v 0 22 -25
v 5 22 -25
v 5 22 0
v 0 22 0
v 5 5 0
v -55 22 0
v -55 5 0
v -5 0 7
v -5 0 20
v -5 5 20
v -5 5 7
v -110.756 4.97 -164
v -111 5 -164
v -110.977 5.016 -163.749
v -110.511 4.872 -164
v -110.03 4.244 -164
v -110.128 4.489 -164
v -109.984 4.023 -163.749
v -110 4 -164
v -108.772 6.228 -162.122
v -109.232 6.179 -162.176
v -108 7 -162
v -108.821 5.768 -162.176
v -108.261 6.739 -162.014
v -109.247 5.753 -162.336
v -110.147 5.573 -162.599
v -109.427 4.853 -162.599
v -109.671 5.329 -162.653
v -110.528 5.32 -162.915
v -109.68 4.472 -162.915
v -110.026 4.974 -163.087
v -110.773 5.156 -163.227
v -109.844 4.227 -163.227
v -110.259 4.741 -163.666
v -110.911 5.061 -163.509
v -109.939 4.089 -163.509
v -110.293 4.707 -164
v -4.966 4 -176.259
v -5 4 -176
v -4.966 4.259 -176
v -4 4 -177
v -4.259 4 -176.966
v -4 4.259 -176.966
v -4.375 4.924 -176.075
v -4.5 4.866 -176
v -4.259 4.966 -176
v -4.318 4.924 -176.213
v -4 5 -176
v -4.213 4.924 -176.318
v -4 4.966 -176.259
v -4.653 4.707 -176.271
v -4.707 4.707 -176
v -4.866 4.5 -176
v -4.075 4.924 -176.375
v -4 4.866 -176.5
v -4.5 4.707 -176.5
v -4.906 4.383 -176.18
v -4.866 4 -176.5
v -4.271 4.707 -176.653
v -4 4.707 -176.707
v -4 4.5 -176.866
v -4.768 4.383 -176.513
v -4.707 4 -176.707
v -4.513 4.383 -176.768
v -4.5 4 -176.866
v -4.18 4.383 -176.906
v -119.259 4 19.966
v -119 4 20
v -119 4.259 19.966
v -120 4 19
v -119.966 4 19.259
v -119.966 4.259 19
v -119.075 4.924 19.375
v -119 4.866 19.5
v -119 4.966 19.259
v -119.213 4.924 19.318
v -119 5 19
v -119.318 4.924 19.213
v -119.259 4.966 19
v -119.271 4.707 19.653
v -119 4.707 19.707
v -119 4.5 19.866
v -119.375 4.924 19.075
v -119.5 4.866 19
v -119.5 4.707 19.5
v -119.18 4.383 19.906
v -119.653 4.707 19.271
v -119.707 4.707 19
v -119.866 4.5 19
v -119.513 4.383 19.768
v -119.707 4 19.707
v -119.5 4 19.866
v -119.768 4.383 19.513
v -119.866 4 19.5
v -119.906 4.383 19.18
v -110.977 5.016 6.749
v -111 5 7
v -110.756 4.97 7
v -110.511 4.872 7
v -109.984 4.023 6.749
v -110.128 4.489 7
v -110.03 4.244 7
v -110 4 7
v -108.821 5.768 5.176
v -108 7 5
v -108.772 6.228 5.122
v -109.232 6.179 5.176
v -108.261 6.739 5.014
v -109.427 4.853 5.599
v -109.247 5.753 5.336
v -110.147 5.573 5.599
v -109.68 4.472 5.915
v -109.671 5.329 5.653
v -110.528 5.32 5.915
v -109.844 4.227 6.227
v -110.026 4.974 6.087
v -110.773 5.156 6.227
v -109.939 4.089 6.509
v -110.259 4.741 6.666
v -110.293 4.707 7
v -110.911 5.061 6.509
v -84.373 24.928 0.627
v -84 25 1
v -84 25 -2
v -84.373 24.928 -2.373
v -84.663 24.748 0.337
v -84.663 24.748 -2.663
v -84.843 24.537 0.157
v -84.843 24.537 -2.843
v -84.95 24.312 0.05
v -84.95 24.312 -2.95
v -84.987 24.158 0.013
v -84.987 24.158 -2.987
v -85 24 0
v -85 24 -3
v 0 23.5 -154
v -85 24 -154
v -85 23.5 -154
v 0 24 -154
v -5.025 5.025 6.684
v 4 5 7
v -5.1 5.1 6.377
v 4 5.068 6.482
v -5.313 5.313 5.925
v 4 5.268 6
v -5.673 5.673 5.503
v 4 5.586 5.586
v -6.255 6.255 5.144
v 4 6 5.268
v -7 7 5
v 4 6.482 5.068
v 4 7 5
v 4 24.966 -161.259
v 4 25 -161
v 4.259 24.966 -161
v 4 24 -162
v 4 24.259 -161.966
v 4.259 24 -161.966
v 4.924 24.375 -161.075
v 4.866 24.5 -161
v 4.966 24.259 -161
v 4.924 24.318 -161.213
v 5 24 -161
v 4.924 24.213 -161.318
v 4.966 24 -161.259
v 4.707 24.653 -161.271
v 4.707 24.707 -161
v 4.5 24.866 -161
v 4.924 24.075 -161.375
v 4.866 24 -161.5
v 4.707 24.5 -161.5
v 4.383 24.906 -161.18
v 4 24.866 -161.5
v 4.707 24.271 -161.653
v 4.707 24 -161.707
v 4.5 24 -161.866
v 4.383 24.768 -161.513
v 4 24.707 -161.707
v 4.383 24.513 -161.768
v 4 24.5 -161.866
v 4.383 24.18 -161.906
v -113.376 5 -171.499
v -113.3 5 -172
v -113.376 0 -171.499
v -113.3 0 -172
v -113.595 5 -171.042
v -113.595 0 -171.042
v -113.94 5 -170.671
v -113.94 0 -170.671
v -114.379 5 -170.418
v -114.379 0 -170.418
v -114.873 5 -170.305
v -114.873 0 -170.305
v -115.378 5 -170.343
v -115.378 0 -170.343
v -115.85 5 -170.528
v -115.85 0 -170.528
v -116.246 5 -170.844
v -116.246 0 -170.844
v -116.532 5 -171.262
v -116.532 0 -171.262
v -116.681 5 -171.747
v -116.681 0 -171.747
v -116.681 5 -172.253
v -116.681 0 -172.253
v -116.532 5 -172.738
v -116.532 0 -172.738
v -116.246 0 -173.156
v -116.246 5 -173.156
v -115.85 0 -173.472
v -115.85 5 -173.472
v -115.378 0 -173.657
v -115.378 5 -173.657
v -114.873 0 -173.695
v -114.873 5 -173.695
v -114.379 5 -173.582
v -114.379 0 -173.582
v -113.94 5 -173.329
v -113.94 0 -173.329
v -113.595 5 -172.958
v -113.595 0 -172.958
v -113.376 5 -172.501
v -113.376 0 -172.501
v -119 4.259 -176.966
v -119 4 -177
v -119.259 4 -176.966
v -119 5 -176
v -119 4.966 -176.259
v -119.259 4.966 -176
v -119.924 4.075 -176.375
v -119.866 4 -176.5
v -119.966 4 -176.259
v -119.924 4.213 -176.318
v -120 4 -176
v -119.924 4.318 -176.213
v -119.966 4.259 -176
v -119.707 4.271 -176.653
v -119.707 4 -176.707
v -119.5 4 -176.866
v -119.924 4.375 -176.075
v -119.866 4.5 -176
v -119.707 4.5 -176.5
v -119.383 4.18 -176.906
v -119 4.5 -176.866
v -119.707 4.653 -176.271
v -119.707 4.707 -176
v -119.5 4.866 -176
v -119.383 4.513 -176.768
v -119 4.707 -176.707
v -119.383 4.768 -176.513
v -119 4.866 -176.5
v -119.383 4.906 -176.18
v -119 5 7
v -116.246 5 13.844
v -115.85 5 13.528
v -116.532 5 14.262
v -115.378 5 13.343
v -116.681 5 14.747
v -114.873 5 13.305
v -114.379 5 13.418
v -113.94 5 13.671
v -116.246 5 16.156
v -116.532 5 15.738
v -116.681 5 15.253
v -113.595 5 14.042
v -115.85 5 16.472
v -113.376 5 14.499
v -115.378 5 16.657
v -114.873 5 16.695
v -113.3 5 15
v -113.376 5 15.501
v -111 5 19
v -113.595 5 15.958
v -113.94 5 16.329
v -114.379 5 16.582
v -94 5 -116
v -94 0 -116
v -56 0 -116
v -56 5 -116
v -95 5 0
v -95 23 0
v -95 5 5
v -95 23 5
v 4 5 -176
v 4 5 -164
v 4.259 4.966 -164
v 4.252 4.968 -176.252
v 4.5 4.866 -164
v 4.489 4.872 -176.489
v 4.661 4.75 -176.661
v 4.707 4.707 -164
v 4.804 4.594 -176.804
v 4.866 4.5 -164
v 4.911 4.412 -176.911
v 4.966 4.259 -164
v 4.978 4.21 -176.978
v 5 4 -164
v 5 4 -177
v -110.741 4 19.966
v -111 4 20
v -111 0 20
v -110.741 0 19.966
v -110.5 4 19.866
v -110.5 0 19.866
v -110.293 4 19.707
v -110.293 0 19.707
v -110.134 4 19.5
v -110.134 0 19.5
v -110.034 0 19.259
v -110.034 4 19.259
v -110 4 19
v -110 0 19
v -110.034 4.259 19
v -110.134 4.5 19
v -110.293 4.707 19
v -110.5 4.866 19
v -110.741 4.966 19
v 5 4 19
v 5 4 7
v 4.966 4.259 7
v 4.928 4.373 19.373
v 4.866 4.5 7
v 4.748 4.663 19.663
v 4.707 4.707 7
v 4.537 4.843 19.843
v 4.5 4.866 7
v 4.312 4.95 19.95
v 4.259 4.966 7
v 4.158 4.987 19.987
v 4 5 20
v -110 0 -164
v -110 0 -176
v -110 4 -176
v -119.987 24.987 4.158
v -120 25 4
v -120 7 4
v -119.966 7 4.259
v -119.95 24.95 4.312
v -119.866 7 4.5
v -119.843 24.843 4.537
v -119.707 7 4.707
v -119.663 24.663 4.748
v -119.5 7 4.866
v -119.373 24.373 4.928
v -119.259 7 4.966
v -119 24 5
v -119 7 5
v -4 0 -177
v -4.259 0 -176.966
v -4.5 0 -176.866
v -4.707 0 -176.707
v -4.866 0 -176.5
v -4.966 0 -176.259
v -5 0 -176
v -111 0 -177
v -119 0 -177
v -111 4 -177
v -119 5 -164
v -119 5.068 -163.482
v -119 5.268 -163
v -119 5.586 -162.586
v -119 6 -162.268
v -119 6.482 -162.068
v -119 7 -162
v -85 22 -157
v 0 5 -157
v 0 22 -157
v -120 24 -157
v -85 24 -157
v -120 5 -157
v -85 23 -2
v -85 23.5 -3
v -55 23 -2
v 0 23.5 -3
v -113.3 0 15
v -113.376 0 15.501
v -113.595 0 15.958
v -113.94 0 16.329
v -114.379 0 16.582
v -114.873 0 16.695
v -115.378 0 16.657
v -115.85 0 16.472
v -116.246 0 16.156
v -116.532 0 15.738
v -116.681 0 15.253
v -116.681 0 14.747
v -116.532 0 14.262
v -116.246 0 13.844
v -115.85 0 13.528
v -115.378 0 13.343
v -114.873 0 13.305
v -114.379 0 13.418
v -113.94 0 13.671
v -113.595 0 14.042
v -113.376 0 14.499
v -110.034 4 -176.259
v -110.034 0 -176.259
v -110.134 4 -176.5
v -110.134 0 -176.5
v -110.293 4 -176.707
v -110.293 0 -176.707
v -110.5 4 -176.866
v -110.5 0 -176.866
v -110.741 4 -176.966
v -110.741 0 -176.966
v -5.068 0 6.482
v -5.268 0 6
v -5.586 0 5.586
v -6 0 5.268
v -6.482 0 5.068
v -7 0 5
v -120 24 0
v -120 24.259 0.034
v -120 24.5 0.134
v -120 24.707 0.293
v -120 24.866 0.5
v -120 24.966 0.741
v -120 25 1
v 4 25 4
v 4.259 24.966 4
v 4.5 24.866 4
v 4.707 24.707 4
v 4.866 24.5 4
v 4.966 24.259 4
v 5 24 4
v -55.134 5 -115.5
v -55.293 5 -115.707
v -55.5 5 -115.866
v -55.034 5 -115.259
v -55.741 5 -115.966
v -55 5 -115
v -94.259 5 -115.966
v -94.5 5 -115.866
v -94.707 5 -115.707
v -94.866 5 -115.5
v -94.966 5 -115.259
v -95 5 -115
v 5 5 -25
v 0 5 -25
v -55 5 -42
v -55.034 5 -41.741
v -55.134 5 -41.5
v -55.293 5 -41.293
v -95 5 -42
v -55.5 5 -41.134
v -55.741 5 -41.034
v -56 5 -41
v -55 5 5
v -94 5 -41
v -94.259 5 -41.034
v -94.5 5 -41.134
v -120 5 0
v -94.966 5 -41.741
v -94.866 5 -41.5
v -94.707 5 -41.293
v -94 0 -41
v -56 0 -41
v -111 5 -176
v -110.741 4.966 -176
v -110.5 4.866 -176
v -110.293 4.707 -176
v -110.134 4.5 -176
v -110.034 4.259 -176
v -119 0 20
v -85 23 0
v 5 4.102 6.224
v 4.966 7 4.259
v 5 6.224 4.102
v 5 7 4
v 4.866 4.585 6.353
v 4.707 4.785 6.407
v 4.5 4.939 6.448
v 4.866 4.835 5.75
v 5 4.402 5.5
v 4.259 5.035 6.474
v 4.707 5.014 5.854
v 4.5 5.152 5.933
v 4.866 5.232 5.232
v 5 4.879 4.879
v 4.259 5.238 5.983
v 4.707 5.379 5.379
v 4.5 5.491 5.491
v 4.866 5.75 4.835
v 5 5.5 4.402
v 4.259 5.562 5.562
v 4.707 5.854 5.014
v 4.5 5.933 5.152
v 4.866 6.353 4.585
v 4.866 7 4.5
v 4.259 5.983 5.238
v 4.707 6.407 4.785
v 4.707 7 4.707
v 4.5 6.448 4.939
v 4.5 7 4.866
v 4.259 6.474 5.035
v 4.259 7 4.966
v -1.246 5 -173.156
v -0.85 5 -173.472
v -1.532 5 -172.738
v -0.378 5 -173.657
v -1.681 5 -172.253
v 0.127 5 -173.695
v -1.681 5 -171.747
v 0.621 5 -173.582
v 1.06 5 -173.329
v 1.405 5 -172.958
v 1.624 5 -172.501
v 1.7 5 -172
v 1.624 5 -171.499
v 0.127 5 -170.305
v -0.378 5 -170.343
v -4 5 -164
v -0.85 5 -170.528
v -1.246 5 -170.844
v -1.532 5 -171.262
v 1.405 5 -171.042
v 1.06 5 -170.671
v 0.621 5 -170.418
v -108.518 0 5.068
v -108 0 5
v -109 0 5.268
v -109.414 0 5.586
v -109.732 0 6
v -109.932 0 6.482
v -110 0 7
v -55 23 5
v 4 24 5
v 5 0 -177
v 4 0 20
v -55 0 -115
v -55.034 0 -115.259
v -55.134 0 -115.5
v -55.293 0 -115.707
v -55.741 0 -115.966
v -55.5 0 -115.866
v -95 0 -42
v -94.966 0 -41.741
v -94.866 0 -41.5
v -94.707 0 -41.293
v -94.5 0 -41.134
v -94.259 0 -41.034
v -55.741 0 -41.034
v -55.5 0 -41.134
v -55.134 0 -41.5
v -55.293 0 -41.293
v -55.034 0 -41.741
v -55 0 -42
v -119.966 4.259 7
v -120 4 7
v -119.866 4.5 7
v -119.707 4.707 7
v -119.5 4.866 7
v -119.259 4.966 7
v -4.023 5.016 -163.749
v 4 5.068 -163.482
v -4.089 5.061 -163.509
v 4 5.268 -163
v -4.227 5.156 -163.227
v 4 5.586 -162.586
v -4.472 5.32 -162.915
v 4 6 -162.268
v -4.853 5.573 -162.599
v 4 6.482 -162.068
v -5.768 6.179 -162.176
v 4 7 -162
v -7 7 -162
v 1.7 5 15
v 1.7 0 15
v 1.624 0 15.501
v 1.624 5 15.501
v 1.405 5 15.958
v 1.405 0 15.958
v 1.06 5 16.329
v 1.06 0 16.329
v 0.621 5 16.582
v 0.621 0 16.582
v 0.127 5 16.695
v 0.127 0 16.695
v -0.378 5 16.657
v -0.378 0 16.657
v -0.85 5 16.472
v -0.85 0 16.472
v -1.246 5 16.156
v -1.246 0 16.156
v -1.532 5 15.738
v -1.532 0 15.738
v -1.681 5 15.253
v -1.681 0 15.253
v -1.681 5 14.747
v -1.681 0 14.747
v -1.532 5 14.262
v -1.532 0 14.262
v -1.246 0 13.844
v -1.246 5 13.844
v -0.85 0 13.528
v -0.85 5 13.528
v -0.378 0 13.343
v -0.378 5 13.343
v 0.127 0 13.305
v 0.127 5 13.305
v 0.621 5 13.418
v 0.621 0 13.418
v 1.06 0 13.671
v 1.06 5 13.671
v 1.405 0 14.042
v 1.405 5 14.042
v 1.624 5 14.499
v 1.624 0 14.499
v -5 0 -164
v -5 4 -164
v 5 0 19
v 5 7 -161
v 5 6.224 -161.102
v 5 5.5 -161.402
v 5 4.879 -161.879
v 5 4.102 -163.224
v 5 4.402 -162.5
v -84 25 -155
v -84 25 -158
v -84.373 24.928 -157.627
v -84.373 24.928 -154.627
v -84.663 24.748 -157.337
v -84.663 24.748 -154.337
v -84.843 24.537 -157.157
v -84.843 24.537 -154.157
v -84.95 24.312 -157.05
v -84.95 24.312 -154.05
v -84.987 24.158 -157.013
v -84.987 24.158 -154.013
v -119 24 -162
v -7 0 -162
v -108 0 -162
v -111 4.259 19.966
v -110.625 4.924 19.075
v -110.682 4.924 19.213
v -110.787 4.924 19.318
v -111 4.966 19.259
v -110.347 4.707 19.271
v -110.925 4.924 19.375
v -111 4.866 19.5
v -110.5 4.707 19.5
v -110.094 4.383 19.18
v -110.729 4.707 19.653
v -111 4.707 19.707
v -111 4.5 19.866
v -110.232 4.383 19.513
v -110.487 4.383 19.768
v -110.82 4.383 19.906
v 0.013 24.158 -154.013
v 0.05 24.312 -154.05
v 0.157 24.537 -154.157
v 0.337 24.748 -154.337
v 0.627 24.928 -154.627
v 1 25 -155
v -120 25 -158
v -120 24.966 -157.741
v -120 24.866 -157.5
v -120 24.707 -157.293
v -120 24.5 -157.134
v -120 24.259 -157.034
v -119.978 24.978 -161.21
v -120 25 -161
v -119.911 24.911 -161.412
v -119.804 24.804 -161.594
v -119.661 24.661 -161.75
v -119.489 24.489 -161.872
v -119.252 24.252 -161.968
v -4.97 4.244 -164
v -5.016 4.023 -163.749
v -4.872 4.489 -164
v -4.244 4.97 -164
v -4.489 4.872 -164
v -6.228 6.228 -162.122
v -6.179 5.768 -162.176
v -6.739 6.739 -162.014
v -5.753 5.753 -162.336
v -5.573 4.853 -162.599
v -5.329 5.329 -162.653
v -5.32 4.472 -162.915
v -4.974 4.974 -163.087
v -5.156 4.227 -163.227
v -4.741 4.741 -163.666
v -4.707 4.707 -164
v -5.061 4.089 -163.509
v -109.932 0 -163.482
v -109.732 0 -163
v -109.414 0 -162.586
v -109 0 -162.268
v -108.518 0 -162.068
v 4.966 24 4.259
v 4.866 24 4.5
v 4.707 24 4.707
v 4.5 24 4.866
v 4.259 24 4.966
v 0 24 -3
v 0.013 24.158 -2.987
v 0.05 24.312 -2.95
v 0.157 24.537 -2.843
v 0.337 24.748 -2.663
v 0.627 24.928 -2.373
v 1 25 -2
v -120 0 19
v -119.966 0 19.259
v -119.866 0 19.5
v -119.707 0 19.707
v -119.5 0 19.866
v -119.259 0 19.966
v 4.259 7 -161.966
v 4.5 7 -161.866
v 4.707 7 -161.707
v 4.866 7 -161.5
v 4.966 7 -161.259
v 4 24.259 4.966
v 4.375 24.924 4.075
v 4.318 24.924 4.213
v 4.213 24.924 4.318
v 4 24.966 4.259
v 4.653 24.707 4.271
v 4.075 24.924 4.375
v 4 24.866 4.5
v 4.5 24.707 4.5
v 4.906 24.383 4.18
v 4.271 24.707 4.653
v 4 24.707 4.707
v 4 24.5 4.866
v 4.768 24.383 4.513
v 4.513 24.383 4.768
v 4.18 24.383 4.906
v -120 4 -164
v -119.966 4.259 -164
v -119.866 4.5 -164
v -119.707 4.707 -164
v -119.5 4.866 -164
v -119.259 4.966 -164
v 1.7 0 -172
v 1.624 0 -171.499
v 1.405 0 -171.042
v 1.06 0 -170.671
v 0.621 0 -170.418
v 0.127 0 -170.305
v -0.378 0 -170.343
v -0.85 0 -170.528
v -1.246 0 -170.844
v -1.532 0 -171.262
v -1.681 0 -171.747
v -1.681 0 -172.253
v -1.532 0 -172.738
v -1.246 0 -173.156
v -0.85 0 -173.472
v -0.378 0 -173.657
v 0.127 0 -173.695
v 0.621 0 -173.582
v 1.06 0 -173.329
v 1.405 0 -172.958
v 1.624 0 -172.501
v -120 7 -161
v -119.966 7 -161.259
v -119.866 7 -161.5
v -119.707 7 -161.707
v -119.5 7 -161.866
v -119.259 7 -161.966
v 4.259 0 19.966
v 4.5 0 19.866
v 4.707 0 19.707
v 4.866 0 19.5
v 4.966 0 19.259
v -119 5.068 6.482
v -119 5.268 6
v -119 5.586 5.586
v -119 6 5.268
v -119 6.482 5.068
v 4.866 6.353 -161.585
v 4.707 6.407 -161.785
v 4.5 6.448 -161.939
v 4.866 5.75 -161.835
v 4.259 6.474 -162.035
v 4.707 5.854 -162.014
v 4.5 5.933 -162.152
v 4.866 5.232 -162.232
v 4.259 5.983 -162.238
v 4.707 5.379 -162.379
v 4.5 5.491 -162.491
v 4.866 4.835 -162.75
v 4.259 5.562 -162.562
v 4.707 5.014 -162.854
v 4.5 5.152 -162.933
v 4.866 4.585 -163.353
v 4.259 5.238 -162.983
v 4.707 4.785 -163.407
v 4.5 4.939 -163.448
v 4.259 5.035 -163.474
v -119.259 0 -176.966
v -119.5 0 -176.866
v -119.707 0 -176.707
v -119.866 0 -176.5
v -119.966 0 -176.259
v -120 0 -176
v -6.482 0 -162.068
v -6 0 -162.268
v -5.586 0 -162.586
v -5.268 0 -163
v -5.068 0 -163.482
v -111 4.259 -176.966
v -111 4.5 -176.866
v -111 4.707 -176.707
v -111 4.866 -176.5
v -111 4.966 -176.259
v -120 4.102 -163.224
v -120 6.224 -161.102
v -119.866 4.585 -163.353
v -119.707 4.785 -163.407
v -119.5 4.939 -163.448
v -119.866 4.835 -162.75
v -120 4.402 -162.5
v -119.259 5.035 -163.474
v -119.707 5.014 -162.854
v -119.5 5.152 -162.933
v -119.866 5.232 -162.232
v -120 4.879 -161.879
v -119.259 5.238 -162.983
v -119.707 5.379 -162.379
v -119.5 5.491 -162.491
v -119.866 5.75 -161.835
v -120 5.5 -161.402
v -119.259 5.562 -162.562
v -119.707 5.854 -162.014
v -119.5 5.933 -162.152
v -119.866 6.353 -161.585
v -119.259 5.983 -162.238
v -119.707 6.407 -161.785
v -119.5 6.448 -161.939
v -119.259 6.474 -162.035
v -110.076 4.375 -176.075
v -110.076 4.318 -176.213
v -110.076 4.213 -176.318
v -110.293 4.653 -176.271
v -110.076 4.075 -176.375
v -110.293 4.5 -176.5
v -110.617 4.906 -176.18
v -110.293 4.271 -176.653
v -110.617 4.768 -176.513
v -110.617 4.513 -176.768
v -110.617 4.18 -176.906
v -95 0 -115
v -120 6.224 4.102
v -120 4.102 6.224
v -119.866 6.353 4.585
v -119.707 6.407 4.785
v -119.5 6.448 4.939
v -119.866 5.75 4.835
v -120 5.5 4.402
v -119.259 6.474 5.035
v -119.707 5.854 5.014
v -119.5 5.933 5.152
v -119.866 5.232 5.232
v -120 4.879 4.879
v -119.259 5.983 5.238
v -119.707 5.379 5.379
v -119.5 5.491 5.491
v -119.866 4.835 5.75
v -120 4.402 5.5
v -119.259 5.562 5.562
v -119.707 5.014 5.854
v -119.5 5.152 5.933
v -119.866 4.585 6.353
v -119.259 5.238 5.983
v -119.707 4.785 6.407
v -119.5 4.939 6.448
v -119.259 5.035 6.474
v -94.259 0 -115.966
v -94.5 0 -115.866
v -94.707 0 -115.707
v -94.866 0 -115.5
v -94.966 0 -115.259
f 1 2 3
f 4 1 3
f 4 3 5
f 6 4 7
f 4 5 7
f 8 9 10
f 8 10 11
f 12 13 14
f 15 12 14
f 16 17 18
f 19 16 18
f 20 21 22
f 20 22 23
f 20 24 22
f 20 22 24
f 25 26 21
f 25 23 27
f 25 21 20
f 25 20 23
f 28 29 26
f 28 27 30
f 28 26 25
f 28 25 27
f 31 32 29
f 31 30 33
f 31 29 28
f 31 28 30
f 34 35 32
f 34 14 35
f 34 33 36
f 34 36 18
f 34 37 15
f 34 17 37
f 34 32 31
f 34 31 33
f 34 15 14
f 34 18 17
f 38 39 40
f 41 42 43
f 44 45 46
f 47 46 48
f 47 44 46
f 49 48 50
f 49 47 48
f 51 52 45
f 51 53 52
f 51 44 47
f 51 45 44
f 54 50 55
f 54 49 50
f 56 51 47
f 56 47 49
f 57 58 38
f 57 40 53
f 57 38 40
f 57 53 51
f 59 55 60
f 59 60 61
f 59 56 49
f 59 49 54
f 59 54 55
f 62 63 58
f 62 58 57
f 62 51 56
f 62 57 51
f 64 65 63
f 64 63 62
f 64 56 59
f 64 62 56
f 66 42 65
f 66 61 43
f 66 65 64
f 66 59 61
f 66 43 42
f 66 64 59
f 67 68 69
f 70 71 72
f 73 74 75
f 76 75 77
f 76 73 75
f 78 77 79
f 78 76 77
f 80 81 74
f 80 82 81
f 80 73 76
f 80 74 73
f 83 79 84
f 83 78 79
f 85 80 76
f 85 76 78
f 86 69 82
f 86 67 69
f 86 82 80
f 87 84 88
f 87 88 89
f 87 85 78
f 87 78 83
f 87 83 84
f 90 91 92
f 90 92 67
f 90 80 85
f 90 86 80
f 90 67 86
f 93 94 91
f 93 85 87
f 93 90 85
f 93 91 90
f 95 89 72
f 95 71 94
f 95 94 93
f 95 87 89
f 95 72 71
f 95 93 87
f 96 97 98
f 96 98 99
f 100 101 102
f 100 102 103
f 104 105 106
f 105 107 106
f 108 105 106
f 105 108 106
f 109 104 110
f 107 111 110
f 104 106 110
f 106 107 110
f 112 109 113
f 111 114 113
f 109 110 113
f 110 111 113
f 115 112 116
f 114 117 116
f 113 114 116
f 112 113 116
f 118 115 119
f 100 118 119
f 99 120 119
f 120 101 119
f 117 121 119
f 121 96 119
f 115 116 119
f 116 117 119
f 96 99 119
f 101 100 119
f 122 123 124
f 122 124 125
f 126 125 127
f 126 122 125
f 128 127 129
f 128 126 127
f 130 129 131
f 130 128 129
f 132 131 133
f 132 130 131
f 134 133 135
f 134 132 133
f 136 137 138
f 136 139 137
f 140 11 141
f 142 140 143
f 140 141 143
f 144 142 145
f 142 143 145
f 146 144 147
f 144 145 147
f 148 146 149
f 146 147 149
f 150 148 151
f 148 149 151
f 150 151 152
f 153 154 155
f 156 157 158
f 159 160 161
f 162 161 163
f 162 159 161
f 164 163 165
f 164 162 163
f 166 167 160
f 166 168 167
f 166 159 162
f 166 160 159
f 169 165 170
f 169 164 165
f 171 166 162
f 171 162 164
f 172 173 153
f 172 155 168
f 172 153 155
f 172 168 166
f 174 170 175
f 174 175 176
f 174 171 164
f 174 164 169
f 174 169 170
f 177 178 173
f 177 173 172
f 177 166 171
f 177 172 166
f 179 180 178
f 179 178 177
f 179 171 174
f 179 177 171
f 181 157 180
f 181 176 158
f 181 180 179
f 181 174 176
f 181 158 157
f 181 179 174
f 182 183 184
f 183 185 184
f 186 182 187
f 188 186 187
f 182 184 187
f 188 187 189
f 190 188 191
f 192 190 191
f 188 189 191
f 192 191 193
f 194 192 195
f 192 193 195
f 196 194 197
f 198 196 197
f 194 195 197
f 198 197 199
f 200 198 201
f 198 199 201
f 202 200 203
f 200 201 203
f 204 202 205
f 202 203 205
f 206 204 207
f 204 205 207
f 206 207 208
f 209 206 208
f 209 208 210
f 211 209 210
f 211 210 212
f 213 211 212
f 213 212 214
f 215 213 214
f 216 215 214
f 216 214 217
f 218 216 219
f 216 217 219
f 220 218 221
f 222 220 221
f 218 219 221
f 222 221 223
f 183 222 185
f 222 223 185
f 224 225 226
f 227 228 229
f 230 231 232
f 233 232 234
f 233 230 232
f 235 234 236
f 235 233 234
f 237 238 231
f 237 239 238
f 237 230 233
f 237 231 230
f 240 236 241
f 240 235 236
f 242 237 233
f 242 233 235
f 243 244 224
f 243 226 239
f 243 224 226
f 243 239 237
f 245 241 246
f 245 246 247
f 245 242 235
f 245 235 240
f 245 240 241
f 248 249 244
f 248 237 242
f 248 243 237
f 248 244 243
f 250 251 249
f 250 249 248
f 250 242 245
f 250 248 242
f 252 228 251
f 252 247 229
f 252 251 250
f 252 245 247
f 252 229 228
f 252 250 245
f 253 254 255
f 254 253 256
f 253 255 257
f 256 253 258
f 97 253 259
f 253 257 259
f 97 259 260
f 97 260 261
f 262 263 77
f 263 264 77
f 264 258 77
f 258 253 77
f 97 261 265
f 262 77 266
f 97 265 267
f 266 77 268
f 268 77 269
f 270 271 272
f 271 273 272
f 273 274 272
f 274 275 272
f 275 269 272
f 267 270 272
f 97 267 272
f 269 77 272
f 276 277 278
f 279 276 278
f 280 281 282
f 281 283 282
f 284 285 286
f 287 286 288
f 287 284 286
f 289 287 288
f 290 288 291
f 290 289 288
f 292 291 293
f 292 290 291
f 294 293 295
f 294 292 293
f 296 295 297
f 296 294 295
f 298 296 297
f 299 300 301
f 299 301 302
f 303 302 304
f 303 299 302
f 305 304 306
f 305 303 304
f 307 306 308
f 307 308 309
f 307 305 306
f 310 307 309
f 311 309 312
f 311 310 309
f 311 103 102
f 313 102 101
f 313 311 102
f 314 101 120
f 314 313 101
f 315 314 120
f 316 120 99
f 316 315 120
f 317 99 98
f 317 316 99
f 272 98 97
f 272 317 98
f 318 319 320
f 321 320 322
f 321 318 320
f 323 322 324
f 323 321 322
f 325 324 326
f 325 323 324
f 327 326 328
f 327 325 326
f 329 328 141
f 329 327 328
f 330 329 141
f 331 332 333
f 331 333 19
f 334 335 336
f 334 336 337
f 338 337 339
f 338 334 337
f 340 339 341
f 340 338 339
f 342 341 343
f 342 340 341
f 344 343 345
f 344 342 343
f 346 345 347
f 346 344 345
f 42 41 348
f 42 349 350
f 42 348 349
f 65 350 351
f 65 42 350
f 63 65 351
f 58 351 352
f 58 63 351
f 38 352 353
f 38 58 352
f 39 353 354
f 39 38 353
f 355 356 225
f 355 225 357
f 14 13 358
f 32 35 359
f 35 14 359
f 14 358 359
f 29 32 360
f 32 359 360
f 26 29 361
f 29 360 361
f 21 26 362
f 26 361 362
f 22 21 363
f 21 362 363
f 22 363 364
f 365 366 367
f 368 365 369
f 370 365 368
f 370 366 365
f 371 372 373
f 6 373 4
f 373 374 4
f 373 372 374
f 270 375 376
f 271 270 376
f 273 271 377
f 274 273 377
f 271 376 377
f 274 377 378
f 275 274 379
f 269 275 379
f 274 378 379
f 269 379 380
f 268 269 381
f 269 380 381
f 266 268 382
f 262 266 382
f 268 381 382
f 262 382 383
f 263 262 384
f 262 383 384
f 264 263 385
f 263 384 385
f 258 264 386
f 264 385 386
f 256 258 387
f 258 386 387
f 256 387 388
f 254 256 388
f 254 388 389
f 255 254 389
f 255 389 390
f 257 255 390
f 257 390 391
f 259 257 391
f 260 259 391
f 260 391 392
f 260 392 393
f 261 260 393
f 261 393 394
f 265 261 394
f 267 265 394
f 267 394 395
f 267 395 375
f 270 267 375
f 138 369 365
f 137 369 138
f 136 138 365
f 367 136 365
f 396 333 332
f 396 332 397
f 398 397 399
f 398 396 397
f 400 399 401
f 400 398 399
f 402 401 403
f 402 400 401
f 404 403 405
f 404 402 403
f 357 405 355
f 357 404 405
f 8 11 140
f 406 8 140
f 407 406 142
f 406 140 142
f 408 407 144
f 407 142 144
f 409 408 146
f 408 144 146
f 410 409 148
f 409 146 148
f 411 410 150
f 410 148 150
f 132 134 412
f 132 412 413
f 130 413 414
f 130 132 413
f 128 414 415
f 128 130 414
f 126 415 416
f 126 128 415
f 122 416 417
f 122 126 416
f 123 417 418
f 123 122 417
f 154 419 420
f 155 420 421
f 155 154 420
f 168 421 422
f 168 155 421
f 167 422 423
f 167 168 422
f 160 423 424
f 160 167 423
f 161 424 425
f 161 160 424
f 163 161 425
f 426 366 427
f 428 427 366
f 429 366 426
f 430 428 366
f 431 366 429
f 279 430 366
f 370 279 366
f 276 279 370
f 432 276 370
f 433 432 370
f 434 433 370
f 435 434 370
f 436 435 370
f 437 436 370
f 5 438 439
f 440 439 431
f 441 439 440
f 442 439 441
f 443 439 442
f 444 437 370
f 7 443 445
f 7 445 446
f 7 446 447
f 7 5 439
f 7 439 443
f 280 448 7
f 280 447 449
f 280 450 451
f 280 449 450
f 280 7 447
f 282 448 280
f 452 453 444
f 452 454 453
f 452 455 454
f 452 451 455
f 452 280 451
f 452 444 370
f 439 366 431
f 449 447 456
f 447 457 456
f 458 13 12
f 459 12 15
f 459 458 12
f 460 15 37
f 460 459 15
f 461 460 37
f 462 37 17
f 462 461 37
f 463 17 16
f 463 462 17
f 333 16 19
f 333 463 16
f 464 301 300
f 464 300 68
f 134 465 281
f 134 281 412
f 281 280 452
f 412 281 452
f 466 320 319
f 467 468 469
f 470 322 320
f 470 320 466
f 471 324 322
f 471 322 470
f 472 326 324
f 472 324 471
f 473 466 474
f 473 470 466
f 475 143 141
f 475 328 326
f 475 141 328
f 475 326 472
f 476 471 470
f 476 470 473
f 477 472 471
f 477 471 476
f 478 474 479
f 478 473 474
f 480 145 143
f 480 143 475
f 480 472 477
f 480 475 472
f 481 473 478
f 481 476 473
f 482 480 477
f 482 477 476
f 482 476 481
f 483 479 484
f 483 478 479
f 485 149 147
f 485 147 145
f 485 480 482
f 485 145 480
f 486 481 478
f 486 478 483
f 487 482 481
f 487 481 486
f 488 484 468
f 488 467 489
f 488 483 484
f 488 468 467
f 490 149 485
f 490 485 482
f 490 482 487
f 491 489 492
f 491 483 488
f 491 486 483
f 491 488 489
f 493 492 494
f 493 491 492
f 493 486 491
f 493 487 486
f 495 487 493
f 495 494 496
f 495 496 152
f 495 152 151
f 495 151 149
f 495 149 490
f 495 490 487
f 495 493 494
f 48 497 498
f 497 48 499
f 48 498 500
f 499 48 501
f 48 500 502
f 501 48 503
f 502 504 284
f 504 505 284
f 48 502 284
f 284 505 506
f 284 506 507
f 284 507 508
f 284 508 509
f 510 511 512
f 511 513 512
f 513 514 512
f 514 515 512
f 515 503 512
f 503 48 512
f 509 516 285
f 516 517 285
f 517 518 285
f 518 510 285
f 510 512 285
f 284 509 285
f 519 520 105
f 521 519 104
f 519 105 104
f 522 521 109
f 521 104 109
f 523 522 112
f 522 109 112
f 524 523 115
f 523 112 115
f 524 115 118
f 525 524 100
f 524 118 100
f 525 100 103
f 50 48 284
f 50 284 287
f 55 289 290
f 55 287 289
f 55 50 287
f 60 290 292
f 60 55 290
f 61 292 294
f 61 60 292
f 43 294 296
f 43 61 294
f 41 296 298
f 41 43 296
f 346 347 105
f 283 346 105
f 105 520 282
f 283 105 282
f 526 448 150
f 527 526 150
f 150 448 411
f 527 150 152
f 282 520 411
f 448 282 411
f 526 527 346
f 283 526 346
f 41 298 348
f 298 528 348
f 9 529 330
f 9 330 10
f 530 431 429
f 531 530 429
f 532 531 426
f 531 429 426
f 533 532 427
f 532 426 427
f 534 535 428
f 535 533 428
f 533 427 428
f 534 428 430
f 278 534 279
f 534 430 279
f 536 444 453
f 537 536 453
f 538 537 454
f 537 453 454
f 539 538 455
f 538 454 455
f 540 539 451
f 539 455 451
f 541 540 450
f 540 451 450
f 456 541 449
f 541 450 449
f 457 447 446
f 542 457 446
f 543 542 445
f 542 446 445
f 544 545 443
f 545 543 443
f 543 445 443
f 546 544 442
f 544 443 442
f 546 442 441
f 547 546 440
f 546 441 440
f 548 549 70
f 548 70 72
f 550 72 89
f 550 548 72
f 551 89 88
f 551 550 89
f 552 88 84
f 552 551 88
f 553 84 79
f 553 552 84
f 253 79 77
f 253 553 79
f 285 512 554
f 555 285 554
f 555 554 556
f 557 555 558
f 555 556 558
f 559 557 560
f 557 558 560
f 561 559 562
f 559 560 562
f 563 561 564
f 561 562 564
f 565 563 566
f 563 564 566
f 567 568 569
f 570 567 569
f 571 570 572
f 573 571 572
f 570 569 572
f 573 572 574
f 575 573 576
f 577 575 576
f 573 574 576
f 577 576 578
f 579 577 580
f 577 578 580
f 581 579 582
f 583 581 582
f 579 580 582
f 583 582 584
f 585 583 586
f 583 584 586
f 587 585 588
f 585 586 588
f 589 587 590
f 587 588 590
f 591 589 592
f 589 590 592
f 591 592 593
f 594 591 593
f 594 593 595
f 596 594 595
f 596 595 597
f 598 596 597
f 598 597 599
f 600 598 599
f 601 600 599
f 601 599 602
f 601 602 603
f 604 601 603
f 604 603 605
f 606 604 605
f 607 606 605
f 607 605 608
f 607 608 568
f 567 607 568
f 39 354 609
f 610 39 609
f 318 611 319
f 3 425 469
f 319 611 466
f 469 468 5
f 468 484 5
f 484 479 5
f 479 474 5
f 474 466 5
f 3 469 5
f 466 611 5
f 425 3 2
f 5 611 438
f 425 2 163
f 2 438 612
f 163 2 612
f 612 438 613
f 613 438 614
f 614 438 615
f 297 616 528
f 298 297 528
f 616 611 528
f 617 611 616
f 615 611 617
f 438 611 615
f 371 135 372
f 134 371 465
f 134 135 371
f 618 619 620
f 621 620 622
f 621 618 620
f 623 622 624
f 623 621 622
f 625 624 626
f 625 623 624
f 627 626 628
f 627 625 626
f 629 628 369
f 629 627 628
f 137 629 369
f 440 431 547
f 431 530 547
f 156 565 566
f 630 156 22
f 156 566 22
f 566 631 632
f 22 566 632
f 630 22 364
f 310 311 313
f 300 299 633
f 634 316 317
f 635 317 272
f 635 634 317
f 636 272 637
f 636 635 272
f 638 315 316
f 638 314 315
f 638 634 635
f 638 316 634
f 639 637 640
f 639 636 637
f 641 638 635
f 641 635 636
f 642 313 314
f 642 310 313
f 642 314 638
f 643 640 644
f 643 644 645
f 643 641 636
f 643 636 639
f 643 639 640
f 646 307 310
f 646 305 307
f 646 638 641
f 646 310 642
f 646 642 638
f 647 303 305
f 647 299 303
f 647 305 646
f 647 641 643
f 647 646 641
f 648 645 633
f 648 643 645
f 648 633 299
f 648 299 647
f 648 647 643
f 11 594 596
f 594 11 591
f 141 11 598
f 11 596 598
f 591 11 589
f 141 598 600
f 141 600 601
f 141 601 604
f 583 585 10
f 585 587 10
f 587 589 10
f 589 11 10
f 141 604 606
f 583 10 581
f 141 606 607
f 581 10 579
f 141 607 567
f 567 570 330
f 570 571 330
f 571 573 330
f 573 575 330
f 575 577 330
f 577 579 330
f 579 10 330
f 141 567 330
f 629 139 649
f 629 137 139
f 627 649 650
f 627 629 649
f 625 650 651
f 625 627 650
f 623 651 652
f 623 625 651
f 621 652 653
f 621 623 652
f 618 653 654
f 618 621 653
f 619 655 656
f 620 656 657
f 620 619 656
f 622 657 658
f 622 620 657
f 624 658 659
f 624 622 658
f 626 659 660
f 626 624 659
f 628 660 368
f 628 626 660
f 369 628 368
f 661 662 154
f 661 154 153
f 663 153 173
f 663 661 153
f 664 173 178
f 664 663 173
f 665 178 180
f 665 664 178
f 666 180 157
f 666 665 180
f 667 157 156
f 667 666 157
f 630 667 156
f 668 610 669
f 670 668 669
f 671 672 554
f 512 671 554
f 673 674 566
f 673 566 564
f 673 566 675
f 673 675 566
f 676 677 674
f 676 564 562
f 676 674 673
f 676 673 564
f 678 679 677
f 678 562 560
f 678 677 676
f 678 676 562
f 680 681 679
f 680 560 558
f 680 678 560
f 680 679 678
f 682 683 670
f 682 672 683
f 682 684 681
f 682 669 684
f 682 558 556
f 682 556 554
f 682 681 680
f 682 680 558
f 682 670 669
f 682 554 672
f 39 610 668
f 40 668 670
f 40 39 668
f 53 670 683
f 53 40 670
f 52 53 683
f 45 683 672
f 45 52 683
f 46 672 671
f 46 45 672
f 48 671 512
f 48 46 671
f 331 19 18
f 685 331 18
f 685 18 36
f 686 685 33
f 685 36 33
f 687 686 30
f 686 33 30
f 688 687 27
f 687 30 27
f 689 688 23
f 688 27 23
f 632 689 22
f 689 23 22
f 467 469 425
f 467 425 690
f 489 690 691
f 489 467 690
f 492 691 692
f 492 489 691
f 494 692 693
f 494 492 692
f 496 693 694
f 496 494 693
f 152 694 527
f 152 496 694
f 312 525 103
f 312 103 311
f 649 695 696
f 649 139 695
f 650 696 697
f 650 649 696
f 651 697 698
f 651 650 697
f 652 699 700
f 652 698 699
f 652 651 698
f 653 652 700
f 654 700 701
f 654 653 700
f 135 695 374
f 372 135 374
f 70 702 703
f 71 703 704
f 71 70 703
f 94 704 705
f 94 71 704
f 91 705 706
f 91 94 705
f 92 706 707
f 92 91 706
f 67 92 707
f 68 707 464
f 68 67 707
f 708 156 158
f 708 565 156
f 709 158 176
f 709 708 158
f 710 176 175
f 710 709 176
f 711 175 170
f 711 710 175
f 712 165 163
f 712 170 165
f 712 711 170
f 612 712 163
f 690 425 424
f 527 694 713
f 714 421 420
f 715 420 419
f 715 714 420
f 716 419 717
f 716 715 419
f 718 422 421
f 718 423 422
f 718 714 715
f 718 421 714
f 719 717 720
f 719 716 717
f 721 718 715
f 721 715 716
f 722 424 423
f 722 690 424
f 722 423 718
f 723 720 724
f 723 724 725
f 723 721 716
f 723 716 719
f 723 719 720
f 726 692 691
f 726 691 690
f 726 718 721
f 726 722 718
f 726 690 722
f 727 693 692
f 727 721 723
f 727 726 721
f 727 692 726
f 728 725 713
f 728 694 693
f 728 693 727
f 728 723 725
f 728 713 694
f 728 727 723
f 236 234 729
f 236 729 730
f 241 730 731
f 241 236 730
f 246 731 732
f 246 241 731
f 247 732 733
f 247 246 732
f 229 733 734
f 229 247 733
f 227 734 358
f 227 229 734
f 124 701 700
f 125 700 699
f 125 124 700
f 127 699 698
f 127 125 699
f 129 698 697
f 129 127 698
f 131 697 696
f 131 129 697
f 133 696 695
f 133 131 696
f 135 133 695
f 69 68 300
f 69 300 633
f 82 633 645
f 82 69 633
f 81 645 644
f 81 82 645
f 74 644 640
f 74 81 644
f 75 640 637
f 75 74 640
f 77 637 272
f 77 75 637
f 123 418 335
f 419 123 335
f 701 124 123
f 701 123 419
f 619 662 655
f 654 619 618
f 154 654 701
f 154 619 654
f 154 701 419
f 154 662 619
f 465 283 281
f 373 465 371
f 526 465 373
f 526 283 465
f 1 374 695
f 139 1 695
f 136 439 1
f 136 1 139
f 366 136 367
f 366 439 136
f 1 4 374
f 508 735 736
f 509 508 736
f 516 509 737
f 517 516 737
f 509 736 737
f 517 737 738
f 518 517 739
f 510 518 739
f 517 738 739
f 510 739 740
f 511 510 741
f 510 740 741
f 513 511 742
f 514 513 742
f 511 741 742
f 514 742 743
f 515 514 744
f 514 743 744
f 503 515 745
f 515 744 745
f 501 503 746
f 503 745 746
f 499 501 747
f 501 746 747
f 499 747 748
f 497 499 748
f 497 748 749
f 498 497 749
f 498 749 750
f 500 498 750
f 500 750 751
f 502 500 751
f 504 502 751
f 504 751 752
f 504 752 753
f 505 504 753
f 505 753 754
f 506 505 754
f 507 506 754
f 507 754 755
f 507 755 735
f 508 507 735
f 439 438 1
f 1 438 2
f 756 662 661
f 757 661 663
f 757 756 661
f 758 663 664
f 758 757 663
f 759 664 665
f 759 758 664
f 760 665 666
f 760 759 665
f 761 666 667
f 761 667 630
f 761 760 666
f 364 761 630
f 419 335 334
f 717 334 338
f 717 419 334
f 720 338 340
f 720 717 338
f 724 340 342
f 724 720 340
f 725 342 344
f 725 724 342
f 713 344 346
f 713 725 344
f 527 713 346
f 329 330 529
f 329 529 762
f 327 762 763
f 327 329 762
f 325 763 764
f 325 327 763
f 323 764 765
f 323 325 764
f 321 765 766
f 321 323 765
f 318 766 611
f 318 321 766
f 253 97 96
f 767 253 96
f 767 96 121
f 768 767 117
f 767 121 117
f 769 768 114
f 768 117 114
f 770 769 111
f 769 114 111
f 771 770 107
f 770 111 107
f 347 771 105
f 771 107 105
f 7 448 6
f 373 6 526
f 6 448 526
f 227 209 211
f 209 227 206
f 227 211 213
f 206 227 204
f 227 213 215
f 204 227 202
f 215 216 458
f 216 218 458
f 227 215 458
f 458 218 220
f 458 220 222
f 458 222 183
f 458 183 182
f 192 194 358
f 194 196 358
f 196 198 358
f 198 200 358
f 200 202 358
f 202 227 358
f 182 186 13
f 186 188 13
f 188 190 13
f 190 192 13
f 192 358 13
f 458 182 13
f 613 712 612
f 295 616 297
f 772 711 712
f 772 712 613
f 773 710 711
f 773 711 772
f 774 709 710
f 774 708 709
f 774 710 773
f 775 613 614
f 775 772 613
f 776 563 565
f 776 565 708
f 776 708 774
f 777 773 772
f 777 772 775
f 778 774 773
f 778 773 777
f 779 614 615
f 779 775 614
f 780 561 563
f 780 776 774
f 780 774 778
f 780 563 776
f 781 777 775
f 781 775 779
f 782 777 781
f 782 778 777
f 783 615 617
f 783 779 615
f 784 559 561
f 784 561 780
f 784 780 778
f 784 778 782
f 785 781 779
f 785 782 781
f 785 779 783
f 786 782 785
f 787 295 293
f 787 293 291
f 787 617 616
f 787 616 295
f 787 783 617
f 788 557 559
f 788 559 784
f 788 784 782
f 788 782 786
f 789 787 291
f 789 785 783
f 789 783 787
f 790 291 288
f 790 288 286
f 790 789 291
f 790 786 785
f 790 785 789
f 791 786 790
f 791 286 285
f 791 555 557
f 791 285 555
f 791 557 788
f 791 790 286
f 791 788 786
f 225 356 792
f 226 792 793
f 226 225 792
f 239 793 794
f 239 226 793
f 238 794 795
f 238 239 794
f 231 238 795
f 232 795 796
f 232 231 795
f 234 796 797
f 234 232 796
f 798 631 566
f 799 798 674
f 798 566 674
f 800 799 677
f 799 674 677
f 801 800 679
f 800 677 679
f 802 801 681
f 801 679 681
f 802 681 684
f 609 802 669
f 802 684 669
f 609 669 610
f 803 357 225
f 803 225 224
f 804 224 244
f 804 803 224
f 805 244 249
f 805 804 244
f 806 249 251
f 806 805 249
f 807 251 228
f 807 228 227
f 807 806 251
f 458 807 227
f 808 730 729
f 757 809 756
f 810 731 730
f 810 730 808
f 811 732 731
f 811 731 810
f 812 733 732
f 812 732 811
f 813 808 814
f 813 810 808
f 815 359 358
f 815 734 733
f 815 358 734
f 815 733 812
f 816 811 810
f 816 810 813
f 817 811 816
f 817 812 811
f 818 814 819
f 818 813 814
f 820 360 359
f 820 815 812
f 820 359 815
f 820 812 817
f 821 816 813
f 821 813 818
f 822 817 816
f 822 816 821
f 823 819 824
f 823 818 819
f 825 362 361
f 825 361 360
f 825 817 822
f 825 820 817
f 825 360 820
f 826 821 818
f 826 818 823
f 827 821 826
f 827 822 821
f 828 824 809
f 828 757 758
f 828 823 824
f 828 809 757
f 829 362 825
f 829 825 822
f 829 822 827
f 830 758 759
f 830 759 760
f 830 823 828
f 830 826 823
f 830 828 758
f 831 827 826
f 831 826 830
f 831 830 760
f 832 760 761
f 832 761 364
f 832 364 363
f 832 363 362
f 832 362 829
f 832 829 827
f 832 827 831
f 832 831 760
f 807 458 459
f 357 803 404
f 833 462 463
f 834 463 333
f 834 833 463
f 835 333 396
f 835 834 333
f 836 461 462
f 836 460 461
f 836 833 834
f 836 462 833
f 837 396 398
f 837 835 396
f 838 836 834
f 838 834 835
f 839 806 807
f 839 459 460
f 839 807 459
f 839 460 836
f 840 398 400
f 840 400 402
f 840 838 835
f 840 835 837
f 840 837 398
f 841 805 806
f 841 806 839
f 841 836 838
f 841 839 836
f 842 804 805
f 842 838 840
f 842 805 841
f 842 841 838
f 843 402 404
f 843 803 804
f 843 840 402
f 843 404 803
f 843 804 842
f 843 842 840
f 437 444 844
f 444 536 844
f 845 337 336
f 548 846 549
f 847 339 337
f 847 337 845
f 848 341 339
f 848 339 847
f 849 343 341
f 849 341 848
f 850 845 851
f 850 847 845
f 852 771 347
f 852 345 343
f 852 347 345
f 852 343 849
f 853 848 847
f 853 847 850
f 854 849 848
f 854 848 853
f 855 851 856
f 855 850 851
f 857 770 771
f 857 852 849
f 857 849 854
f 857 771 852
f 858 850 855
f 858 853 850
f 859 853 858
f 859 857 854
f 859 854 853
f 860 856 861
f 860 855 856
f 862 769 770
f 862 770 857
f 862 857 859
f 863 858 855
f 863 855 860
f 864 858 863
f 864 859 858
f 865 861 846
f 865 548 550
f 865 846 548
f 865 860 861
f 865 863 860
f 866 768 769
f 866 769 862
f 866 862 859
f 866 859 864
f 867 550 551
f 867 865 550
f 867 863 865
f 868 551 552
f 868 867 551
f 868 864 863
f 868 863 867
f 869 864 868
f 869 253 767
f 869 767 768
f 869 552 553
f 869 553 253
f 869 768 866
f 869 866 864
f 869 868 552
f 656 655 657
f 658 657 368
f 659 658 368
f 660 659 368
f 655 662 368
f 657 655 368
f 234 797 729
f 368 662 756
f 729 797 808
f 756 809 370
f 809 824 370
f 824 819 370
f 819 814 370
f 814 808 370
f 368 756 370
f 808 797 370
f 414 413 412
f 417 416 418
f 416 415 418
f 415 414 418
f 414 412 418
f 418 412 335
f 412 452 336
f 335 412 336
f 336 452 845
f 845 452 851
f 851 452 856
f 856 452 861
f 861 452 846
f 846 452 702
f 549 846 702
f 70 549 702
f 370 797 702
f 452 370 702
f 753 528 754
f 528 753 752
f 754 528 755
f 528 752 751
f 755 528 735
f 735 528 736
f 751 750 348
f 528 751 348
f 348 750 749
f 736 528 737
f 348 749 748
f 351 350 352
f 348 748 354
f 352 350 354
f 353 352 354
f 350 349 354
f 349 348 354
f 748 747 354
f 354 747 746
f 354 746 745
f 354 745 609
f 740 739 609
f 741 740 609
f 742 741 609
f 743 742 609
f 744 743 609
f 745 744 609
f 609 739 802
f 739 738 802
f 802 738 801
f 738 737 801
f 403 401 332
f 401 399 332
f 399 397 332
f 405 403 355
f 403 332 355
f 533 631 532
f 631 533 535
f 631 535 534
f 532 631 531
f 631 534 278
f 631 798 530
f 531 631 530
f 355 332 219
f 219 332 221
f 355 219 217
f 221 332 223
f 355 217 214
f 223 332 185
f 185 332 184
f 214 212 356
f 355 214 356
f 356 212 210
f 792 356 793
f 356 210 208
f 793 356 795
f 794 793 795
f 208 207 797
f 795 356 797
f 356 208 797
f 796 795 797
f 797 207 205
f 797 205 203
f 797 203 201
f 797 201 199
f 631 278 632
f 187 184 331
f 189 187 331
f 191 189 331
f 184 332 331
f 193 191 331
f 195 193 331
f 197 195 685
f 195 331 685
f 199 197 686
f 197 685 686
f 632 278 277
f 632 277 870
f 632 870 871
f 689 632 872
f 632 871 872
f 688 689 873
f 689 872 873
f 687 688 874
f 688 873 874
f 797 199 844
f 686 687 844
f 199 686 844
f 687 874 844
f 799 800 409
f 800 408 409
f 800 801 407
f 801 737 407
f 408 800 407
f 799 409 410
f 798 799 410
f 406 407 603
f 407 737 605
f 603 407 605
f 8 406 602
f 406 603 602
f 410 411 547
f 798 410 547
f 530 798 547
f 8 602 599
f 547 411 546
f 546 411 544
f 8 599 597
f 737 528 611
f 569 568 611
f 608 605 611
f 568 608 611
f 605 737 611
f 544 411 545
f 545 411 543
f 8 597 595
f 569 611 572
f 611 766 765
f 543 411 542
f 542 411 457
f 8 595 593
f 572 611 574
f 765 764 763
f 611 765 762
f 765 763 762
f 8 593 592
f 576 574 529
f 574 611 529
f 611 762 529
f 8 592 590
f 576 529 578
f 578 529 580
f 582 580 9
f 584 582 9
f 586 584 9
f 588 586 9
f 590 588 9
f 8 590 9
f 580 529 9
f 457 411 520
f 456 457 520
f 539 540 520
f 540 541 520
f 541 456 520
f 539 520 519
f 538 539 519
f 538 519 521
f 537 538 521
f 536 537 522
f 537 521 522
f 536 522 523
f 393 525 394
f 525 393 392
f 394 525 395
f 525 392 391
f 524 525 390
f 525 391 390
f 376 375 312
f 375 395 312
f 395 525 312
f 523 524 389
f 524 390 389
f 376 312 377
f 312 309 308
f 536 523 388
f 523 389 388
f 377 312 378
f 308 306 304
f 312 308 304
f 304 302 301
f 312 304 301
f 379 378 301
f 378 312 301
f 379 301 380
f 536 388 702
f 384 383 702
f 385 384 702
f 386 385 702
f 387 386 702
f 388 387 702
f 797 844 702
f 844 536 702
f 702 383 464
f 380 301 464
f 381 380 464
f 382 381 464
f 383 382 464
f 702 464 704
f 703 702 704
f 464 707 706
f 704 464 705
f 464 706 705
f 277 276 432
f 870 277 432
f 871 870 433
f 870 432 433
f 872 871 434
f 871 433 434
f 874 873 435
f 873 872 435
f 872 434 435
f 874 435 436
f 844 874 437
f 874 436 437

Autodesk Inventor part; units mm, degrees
ref_plane "YZ Plane" through (0, 0, 0) normal (1, 0, 0) x (0, 1, 0)
ref_plane "XZ Plane" through (0, 0, 0) normal (0, 1, 0) x (-1, 0, 0)
ref_plane "XY Plane" through (0, 0, 0) normal (0, 0, 1) x (1, 0, 0)
sketch "スケッチ1" plane through (0, 0, 0) normal (0, 1, 0) x (-1, 0, 0)
  line L0 (0, 0) -> (115, 0)
  line L1 (115, 0) -> (115, -157)
  line L2 (115, -157) -> (0, -157)
  line L3 (0, -157) -> (0, 0)
  line L4 (120, -162) -> (120, 5)
  line L5 (120, 5) -> (-5, 5)
  line L6 (-5, 5) -> (-5, -162)
  line L7 (-5, -162) -> (120, -162)
  dimension "d0" = 115
  dimension "d1" = 157
  dimension "d2" = 5
extrude "押し出し1" add sketch "スケッチ1" along normal blind 5 contours L0 L1 L2 L3 | L7 L6 L5 L4
sketch "スケッチ2" plane through (0, 5, 0) normal (0, 1, 0) x (1, 0, 0)
  line L0 (-120, -5) -> (5, -5) projected
  line L1 (5, -5) -> (5, 162) projected
  line L2 (5, 162) -> (-120, 162) projected
  line L3 (-120, 162) -> (-120, -5) projected
  line L4 (-115, 0) -> (0, 0)
  line L5 (0, 0) -> (0, 157)
  line L6 (0, 157) -> (-115, 157)
  line L7 (-115, 157) -> (-115, 0)
  line L8 (-115, 0) -> (-120, 0)
  line L9 (-120, 162) -> (-120, -5) projected
  line L10 (-115, 157) -> (-120, 157)
  point P0 (0, 0)
  dimension "d5" = 5
extrude "押し出し2" add sketch "スケッチ2" along normal blind 20 contours L3 L8 L4 L5 L6 L10 L2 L1 L0
sketch "スケッチ3" plane through (0, 5, -157) normal (-1, 0, 0) x (0, 0, 1)
  line L0 (0, 0) -> (0, 20) projected
  line L1 (0, 20) -> (3, 20)
  line L2 (0, 20) -> (157, 20) projected
  line L3 (3, 20) -> (3, 18.5)
  line L4 (3, 18.5) -> (0, 17)
  line L5 (78.5, 20) -> (78.5, -5)
  line L6 (-5, -5) -> (162, -5) projected
  line L7 (157, 20) -> (154, 20)
  line L8 (154, 20) -> (154, 18.5)
  line L9 (154, 18.5) -> (157, 17)
  line L10 (157, 0) -> (0, 0) projected
  line L11 (157, 0) -> (157, 20) projected
  line L12 (0, 20) -> (157, 20) projected
  line L13 (0, 0) -> (0, 20) projected
  point P0 (157, -5)
  point P1 (157, 17)
  point P2 (154, 20)
  dimension "d8" = 3
  dimension "d9" = 1.5
  dimension "d10" = 1.5
extrude "押し出し3" add sketch "スケッチ3" along normal blind 85 contours L0 L1 L3 L4 | L2 L11 L9 L8
sketch "スケッチ4" plane through (-120, 0, 5) normal (0, 0, 1) x (1, 0, 0)
  line L0 (120, 25) -> (35, 25) projected
  line L1 (65, 25) -> (25, 25)
  line L2 (25, 25) -> (25, 5)
  line L3 (25, 5) -> (65, 5)
  line L4 (65, 5) -> (65, 25)
  line L5 (0, 0) -> (0, 25) projected
  line L6 (0, 5) -> (120, 5) projected
  line L7 (25, 23) -> (65, 23)
  point P0 (120, 0)
  dimension "d13" = 65
  dimension "d14" = 40
  dimension "d15" = 0
  dimension "d16" = 2
extrude "押し出し4" cut sketch "スケッチ4" against normal blind 10 contours L4 L3 L2 L7
sketch "スケッチ5" plane through (0, 0, 0) normal (0, -1, 0) x (1, 0, 0)
  line L0 (-95, -116) -> (-55, -116)
  line L1 (-55, -116) -> (-55, -41)
  line L2 (-55, -41) -> (-95, -41)
  line L3 (-95, -41) -> (-95, -116)
  line L4 (-120, -162) -> (-120, 5) projected
  point P0 (0, 0)
  point P1 (-120, -78.5)
  point P2 (-95, -78.5)
  dimension "d19" = 65
  dimension "d20" = 75
  dimension "d21" = 25
  dimension "d22" = 0
extrude "押し出し5" cut sketch "スケッチ5" against normal through all
sketch "スケッチ6" plane through (5, 0, 5) normal (1, 0, 0) x (0, 0, -1)
  line L0 (5, 5) -> (5, 22) projected
  line L1 (5, 5) -> (30, 5)
  line L2 (30, 5) -> (30, 22)
  line L3 (30, 22) -> (5, 22)
  line L4 (5, 22) -> (5, 5)
  point P0 (5, 0)
  dimension "d25" = 25
  dimension "d26" = 0
extrude "押し出し6" cut sketch "スケッチ6" against normal up to surface (5 mm away)
sketch "スケッチ7" plane through (0, 0, 0) normal (0, -1, 0) x (1, 0, 0)
  circle A0 centre (-115, 15) radius 1.7
  circle A1 centre (0, 15) radius 1.7
  circle A2 centre (-115, -172) radius 1.7
  circle A3 centre (0, -172) radius 1.7
  line L0 (5, -162) -> (-120, -162) projected
  line L1 (-5, -162) -> (5, -162)
  line L2 (5, -162) -> (5, -177)
  line L3 (5, -177) -> (-5, -177)
  line L4 (-5, -177) -> (-5, -162)
  line L5 (-110, -162) -> (-120, -162)
  line L6 (-120, -162) -> (-120, -177)
  line L7 (-120, -177) -> (-110, -177)
  line L8 (-110, -177) -> (-110, -162)
  line L9 (-120, 5) -> (5, 5) projected
  line L10 (-120, 5) -> (-110, 5)
  line L11 (-110, 5) -> (-110, 20)
  line L12 (-110, 20) -> (-120, 20)
  line L13 (-120, 20) -> (-120, 5)
  line L14 (-5, 5) -> (5, 5)
  line L15 (5, 5) -> (5, 20)
  line L16 (5, 20) -> (-5, 20)
  line L17 (-5, 20) -> (-5, 5)
  line L18 (5, 5) -> (5, -162) projected
  line L19 (-120, -162) -> (-120, 5) projected
  circle A4 centre (120, -172) radius 1.7
  circle A5 centre (62.9804, -172) radius 1.525
  point P0 (0, 0)
  dimension "d29" = 3.4
  dimension "d30" = 3.4
  dimension "d31" = 3.4
  dimension "d32" = 3.4
  dimension "d33" = 5
  dimension "d34" = 5
  dimension "d35" = 5
  dimension "d36" = 5
  dimension "d37" = 5
  dimension "d38" = 5
  dimension "d39" = 5
  dimension "d40" = 5
  dimension "d41" = 5
  dimension "d42" = 5
  dimension "d43" = 5
  dimension "d44" = 5
  dimension "d45" = 10
  dimension "d46" = 10
  dimension "d47" = 10
  dimension "d48" = 10
  dimension "d56" = 0
  dimension "d57" = 0
  dimension "d60" = 57.0196
  dimension "d63" = 0
  dimension "d64" = 0
extrude "押し出し7" add sketch "スケッチ7" against normal blind 5 contours L2 L3 L4 L0 | L9 L17 L16 L15 | L8 L7 L6 L0 | L9 L13 L12 L11
fillet "フィレット1" radius 2 8 edges at (-110, 2.5, 5) (-5, 2.5, 5) (-110, 2.5, -162) (-5, 2.5, -162) (0, 5, -162) (-115, 5, -162) (-115, 5, 5) (0, 5, 5)
fillet "フィレット2" radius 1 37 edges at (5, 5, 13.5) (5, 16, 5) (5, 2.5, 20) (-57.5, 25, 5) (-110, 2.5, 20) (-120, 2.5, 20) (-5, 2.5, -177) (-57.5, 25, -162) (5, 25, -78.5) (5, 5, -170.5) (5, 16, -162) (-5.5858, 5.5858, -162.5858) (-5, 5, -170.5) (0, 5, -177) (-115, 5, -177) (-109.4142, 5.5858, -162.5858) (-110, 5, -170.5) (-120, 2.5, -177) (-110, 2.5, -177) (-120, 16, -162) (-120, 5, -170.5) (-120, 5, 13.5) (-120, 16, 5) (-109.4142, 5.5858, 5.5858) (-110, 5, 13.5) (-115, 5, 20) (-42.5, 25, -3) (-102.5, 25, 0) (0, 25, -78.5) (-42.5, 25, -154) (-102.5, 25, -157) (-85, 25, -155.5) (-85, 25, -1.5) (-95, 2.5, -41) (-55, 2.5, -41) (-55, 2.5, -116) (-95, 2.5, -116)
properties part number "pccase"
